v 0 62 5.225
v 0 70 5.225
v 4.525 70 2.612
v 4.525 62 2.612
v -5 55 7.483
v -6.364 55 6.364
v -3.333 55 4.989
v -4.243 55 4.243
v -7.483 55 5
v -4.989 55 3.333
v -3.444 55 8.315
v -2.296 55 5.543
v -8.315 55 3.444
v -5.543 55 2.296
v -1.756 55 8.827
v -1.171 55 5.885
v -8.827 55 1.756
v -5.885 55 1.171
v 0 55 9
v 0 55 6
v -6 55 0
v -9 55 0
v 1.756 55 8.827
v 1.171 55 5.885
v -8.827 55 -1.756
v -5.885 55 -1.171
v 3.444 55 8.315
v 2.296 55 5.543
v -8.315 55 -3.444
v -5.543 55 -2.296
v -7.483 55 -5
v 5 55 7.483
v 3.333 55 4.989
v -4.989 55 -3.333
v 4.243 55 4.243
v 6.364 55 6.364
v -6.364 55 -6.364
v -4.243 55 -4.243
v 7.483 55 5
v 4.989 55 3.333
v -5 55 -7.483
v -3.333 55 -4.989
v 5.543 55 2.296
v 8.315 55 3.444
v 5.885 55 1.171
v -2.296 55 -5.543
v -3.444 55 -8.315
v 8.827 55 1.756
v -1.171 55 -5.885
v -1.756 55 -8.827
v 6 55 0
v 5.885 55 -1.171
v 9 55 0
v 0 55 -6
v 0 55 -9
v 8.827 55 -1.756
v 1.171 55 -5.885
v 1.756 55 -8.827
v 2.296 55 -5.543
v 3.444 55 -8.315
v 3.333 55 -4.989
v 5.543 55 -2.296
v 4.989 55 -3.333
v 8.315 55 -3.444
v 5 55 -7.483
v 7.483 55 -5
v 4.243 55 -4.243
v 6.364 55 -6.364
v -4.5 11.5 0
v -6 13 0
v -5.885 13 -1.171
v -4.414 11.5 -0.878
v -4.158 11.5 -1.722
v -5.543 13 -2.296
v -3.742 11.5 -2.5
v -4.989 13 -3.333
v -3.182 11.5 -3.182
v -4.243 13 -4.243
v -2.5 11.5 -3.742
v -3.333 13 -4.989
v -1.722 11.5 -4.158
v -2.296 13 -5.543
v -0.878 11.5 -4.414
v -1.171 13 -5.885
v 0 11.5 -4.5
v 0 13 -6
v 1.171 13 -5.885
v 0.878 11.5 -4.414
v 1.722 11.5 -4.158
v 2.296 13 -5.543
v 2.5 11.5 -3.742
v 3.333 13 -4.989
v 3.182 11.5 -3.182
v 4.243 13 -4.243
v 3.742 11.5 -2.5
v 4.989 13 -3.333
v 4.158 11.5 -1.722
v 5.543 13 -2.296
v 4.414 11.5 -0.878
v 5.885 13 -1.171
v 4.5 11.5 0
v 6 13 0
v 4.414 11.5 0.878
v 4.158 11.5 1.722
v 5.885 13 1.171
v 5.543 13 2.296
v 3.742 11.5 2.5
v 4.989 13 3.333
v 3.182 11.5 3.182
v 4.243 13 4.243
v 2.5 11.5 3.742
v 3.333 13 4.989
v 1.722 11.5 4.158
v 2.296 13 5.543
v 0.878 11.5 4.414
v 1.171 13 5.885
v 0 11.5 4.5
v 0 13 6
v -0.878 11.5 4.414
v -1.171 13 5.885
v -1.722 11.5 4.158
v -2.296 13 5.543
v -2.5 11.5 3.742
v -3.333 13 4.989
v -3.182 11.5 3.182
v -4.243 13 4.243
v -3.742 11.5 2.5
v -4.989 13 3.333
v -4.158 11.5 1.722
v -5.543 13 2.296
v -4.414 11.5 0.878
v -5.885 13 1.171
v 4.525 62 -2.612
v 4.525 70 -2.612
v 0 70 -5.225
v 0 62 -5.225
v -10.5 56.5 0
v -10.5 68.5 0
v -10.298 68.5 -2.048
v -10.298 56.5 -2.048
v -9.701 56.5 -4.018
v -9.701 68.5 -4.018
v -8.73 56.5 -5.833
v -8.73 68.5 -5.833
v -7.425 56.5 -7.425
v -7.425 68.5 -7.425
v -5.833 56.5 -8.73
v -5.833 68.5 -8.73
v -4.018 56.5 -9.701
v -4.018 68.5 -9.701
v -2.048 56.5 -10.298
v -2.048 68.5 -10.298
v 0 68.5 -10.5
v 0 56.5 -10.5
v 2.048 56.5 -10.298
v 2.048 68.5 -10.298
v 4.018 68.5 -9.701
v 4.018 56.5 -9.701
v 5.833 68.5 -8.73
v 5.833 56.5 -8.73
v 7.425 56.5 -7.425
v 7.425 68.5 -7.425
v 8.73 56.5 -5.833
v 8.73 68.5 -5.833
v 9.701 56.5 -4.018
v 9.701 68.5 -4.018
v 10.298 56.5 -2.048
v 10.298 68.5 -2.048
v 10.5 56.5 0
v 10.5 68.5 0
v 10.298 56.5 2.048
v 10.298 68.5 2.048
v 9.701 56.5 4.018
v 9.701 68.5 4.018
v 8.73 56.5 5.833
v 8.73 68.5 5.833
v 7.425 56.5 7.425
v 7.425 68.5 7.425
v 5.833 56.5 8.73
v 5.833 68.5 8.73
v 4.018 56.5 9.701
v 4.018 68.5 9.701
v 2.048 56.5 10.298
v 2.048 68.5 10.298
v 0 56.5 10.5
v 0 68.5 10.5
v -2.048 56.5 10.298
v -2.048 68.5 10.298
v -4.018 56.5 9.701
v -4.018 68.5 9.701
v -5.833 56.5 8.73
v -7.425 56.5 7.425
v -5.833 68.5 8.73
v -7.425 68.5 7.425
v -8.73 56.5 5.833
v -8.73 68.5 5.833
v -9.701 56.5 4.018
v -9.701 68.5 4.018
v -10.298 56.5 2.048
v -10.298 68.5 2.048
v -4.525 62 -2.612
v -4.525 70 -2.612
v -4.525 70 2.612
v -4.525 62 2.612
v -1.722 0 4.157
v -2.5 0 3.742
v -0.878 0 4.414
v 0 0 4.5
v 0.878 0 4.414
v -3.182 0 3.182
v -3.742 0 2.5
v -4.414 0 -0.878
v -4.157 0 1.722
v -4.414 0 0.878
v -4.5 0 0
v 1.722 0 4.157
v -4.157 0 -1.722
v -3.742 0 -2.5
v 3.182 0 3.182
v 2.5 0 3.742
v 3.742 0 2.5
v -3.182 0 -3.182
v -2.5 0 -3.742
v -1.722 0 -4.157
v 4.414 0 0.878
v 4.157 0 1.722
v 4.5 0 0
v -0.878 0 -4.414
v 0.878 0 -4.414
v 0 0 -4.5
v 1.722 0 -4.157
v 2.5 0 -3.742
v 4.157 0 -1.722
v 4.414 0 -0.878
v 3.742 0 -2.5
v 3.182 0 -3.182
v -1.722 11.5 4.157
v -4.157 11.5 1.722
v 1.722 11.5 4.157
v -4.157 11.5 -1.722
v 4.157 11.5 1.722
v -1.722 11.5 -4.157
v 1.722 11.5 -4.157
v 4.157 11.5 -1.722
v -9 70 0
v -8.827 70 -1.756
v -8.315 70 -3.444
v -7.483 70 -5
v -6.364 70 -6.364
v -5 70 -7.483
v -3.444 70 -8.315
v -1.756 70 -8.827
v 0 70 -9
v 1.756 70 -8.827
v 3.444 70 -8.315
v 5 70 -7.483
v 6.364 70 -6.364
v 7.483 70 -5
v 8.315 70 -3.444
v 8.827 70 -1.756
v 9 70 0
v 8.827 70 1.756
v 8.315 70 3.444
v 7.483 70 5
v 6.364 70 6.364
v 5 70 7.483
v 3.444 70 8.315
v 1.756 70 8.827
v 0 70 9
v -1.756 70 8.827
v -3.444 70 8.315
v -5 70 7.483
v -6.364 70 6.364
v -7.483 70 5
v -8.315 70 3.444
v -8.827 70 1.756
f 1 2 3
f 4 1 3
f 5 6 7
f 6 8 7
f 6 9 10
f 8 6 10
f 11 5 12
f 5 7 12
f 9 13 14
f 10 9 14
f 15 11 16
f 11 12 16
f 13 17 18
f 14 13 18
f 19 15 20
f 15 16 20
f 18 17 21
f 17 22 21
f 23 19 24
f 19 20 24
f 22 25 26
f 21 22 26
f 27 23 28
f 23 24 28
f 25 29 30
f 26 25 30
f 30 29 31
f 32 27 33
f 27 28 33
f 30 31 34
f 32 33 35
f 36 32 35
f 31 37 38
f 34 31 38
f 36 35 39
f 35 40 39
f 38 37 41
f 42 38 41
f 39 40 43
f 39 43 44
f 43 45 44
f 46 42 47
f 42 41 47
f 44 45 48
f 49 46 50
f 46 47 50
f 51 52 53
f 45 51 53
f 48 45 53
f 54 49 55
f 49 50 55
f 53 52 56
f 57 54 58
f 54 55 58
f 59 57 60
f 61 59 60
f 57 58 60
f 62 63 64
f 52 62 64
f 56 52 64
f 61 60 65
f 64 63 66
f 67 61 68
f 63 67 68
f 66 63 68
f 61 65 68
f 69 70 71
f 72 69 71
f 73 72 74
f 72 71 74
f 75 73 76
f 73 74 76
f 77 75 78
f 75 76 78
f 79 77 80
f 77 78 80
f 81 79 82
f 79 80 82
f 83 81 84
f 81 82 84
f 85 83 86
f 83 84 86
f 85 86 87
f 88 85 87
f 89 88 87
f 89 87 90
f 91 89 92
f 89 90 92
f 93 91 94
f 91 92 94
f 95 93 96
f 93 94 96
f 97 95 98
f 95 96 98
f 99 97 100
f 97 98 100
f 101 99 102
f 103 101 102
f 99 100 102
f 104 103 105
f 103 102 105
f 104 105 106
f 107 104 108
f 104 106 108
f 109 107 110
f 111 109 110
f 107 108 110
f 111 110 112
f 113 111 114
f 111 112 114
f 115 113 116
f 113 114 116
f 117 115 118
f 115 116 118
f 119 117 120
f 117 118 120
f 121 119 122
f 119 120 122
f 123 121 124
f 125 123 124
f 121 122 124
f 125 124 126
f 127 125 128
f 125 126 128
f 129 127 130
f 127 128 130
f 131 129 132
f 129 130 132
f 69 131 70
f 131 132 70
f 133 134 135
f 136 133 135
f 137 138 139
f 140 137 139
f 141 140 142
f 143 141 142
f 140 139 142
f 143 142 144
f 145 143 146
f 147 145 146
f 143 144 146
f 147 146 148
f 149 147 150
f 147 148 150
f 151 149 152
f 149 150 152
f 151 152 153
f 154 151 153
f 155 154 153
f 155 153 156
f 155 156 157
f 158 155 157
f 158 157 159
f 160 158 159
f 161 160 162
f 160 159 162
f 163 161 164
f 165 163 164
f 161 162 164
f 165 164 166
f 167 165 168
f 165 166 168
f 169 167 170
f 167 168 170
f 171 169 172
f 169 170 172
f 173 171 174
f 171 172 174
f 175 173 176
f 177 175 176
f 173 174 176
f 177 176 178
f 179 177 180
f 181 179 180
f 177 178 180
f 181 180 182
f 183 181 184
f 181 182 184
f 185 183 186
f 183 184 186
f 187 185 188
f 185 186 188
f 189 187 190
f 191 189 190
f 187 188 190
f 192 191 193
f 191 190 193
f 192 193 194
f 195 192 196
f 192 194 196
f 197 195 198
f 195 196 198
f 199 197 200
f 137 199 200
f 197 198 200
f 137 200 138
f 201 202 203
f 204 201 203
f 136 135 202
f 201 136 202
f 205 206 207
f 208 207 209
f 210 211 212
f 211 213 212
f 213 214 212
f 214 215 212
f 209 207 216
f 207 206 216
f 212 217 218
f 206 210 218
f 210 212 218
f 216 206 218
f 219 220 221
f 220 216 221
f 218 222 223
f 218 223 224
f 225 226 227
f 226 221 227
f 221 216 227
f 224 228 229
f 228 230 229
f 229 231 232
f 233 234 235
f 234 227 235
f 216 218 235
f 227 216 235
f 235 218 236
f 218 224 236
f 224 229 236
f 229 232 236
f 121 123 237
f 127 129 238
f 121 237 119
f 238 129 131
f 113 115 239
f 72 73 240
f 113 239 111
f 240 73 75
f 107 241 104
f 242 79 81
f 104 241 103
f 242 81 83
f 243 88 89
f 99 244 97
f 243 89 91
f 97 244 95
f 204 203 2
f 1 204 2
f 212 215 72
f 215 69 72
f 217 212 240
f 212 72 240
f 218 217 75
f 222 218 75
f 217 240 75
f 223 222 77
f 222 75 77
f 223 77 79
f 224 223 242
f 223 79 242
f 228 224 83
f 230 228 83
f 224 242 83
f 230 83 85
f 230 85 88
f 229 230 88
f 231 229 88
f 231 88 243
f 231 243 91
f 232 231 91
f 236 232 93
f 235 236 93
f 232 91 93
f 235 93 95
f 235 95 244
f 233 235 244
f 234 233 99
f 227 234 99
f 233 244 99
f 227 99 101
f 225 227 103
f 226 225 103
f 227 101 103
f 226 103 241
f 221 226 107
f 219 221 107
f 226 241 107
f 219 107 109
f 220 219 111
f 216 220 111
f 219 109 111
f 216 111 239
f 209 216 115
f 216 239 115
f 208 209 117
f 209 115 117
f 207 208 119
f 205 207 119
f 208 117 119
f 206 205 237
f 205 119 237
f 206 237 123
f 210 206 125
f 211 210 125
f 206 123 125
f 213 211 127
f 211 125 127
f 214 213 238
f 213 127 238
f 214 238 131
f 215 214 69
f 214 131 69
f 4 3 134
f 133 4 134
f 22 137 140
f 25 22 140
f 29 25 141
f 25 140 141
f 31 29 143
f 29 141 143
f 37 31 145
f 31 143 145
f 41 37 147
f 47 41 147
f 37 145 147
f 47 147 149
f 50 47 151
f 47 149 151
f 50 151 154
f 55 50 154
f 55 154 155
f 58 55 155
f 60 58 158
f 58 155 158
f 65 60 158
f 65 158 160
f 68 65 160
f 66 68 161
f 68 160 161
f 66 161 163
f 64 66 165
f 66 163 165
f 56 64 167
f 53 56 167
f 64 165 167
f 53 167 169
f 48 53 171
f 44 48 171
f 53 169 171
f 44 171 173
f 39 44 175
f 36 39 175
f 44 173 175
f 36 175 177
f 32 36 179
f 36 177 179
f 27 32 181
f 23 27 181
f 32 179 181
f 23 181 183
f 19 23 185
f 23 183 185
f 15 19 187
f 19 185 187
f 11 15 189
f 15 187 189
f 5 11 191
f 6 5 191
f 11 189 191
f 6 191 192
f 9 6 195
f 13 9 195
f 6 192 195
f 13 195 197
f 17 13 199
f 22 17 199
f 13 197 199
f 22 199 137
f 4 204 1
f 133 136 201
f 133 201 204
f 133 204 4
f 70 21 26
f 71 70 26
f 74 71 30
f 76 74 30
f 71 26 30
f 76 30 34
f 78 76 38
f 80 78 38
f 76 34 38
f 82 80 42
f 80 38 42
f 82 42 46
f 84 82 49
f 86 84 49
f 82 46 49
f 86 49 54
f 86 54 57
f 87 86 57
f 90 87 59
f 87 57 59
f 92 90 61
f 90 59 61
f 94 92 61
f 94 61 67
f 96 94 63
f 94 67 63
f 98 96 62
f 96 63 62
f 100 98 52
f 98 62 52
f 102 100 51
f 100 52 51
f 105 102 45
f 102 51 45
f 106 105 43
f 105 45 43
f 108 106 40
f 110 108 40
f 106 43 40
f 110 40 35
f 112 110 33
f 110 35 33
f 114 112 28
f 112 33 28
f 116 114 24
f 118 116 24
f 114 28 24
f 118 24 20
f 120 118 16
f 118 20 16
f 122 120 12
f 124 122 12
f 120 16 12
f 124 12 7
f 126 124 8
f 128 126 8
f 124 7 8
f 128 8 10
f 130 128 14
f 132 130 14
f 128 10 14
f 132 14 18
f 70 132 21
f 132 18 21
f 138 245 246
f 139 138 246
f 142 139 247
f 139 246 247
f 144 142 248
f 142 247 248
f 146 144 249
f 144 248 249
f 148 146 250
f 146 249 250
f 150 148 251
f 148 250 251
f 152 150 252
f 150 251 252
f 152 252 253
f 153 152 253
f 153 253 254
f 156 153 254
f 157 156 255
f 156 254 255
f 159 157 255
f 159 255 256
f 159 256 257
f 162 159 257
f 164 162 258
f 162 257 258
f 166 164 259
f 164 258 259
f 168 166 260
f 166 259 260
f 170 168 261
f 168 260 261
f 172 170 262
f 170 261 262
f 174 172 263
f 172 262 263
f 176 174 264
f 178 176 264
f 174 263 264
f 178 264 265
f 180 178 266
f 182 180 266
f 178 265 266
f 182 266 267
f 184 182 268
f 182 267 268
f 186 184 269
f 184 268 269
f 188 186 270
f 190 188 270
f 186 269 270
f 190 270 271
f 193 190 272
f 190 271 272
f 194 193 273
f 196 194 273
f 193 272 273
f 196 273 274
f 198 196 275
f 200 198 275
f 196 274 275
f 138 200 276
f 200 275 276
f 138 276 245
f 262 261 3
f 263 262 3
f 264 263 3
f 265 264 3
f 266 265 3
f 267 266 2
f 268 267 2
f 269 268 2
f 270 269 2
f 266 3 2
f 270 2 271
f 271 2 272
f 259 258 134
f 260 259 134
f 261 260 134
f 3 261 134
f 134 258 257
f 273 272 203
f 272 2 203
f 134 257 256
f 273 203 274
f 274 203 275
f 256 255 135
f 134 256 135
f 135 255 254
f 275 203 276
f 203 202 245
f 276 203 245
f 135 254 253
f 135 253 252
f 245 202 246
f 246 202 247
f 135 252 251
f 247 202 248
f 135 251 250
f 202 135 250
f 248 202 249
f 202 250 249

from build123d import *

# Parameters (mm, degrees)
CHAMFER1_SIZE      = 1.5
CUT_EXTRUDE1_DEPTH = 8


with BuildPart() as part:
    # Sketch1 → Revolve1 (revolve)
    with BuildSketch(Plane.XY, mode=Mode.PRIVATE) as revolve1_sk:
        Polygon((0, 0), (4.5, 0), (4.5, 11.5), (6, 11.5), (6, 55), (10.5, 55), (10.5, 70), (0, 70), align=None)
    revolve(revolve1_sk.sketch.rotate(Axis((0, 70, 0), (0, -1, 0)), 180), axis=Axis((0, 70, 0), (0, -1, 0)))

    # Chamfer1
    chamfer1_edges = [part.edges().sort_by_distance(p)[0] for p in [
        (10.5, 70, 0),
        (10.5, 55, 0),
        (6, 11.5, 0),
    ]]
    chamfer(chamfer1_edges, length=CHAMFER1_SIZE - 0.0001)  # a hair under: the kernel refuses the full size

    # Sketch2 → Cut-Extrude1 (cut)
    with BuildSketch(Plane(origin=(0, 70, 0), x_dir=(1, 0, 0), z_dir=(0, 1, 0))):
        Polygon((0, 5.22463141), (-4.524663526, 2.612315705), (-4.524663526, -2.612315705), (0, -5.22463141), (4.524663526, -2.612315705), (4.524663526, 2.612315705), align=None)
    extrude(amount=-CUT_EXTRUDE1_DEPTH, mode=Mode.SUBTRACT)


solid = part.part
